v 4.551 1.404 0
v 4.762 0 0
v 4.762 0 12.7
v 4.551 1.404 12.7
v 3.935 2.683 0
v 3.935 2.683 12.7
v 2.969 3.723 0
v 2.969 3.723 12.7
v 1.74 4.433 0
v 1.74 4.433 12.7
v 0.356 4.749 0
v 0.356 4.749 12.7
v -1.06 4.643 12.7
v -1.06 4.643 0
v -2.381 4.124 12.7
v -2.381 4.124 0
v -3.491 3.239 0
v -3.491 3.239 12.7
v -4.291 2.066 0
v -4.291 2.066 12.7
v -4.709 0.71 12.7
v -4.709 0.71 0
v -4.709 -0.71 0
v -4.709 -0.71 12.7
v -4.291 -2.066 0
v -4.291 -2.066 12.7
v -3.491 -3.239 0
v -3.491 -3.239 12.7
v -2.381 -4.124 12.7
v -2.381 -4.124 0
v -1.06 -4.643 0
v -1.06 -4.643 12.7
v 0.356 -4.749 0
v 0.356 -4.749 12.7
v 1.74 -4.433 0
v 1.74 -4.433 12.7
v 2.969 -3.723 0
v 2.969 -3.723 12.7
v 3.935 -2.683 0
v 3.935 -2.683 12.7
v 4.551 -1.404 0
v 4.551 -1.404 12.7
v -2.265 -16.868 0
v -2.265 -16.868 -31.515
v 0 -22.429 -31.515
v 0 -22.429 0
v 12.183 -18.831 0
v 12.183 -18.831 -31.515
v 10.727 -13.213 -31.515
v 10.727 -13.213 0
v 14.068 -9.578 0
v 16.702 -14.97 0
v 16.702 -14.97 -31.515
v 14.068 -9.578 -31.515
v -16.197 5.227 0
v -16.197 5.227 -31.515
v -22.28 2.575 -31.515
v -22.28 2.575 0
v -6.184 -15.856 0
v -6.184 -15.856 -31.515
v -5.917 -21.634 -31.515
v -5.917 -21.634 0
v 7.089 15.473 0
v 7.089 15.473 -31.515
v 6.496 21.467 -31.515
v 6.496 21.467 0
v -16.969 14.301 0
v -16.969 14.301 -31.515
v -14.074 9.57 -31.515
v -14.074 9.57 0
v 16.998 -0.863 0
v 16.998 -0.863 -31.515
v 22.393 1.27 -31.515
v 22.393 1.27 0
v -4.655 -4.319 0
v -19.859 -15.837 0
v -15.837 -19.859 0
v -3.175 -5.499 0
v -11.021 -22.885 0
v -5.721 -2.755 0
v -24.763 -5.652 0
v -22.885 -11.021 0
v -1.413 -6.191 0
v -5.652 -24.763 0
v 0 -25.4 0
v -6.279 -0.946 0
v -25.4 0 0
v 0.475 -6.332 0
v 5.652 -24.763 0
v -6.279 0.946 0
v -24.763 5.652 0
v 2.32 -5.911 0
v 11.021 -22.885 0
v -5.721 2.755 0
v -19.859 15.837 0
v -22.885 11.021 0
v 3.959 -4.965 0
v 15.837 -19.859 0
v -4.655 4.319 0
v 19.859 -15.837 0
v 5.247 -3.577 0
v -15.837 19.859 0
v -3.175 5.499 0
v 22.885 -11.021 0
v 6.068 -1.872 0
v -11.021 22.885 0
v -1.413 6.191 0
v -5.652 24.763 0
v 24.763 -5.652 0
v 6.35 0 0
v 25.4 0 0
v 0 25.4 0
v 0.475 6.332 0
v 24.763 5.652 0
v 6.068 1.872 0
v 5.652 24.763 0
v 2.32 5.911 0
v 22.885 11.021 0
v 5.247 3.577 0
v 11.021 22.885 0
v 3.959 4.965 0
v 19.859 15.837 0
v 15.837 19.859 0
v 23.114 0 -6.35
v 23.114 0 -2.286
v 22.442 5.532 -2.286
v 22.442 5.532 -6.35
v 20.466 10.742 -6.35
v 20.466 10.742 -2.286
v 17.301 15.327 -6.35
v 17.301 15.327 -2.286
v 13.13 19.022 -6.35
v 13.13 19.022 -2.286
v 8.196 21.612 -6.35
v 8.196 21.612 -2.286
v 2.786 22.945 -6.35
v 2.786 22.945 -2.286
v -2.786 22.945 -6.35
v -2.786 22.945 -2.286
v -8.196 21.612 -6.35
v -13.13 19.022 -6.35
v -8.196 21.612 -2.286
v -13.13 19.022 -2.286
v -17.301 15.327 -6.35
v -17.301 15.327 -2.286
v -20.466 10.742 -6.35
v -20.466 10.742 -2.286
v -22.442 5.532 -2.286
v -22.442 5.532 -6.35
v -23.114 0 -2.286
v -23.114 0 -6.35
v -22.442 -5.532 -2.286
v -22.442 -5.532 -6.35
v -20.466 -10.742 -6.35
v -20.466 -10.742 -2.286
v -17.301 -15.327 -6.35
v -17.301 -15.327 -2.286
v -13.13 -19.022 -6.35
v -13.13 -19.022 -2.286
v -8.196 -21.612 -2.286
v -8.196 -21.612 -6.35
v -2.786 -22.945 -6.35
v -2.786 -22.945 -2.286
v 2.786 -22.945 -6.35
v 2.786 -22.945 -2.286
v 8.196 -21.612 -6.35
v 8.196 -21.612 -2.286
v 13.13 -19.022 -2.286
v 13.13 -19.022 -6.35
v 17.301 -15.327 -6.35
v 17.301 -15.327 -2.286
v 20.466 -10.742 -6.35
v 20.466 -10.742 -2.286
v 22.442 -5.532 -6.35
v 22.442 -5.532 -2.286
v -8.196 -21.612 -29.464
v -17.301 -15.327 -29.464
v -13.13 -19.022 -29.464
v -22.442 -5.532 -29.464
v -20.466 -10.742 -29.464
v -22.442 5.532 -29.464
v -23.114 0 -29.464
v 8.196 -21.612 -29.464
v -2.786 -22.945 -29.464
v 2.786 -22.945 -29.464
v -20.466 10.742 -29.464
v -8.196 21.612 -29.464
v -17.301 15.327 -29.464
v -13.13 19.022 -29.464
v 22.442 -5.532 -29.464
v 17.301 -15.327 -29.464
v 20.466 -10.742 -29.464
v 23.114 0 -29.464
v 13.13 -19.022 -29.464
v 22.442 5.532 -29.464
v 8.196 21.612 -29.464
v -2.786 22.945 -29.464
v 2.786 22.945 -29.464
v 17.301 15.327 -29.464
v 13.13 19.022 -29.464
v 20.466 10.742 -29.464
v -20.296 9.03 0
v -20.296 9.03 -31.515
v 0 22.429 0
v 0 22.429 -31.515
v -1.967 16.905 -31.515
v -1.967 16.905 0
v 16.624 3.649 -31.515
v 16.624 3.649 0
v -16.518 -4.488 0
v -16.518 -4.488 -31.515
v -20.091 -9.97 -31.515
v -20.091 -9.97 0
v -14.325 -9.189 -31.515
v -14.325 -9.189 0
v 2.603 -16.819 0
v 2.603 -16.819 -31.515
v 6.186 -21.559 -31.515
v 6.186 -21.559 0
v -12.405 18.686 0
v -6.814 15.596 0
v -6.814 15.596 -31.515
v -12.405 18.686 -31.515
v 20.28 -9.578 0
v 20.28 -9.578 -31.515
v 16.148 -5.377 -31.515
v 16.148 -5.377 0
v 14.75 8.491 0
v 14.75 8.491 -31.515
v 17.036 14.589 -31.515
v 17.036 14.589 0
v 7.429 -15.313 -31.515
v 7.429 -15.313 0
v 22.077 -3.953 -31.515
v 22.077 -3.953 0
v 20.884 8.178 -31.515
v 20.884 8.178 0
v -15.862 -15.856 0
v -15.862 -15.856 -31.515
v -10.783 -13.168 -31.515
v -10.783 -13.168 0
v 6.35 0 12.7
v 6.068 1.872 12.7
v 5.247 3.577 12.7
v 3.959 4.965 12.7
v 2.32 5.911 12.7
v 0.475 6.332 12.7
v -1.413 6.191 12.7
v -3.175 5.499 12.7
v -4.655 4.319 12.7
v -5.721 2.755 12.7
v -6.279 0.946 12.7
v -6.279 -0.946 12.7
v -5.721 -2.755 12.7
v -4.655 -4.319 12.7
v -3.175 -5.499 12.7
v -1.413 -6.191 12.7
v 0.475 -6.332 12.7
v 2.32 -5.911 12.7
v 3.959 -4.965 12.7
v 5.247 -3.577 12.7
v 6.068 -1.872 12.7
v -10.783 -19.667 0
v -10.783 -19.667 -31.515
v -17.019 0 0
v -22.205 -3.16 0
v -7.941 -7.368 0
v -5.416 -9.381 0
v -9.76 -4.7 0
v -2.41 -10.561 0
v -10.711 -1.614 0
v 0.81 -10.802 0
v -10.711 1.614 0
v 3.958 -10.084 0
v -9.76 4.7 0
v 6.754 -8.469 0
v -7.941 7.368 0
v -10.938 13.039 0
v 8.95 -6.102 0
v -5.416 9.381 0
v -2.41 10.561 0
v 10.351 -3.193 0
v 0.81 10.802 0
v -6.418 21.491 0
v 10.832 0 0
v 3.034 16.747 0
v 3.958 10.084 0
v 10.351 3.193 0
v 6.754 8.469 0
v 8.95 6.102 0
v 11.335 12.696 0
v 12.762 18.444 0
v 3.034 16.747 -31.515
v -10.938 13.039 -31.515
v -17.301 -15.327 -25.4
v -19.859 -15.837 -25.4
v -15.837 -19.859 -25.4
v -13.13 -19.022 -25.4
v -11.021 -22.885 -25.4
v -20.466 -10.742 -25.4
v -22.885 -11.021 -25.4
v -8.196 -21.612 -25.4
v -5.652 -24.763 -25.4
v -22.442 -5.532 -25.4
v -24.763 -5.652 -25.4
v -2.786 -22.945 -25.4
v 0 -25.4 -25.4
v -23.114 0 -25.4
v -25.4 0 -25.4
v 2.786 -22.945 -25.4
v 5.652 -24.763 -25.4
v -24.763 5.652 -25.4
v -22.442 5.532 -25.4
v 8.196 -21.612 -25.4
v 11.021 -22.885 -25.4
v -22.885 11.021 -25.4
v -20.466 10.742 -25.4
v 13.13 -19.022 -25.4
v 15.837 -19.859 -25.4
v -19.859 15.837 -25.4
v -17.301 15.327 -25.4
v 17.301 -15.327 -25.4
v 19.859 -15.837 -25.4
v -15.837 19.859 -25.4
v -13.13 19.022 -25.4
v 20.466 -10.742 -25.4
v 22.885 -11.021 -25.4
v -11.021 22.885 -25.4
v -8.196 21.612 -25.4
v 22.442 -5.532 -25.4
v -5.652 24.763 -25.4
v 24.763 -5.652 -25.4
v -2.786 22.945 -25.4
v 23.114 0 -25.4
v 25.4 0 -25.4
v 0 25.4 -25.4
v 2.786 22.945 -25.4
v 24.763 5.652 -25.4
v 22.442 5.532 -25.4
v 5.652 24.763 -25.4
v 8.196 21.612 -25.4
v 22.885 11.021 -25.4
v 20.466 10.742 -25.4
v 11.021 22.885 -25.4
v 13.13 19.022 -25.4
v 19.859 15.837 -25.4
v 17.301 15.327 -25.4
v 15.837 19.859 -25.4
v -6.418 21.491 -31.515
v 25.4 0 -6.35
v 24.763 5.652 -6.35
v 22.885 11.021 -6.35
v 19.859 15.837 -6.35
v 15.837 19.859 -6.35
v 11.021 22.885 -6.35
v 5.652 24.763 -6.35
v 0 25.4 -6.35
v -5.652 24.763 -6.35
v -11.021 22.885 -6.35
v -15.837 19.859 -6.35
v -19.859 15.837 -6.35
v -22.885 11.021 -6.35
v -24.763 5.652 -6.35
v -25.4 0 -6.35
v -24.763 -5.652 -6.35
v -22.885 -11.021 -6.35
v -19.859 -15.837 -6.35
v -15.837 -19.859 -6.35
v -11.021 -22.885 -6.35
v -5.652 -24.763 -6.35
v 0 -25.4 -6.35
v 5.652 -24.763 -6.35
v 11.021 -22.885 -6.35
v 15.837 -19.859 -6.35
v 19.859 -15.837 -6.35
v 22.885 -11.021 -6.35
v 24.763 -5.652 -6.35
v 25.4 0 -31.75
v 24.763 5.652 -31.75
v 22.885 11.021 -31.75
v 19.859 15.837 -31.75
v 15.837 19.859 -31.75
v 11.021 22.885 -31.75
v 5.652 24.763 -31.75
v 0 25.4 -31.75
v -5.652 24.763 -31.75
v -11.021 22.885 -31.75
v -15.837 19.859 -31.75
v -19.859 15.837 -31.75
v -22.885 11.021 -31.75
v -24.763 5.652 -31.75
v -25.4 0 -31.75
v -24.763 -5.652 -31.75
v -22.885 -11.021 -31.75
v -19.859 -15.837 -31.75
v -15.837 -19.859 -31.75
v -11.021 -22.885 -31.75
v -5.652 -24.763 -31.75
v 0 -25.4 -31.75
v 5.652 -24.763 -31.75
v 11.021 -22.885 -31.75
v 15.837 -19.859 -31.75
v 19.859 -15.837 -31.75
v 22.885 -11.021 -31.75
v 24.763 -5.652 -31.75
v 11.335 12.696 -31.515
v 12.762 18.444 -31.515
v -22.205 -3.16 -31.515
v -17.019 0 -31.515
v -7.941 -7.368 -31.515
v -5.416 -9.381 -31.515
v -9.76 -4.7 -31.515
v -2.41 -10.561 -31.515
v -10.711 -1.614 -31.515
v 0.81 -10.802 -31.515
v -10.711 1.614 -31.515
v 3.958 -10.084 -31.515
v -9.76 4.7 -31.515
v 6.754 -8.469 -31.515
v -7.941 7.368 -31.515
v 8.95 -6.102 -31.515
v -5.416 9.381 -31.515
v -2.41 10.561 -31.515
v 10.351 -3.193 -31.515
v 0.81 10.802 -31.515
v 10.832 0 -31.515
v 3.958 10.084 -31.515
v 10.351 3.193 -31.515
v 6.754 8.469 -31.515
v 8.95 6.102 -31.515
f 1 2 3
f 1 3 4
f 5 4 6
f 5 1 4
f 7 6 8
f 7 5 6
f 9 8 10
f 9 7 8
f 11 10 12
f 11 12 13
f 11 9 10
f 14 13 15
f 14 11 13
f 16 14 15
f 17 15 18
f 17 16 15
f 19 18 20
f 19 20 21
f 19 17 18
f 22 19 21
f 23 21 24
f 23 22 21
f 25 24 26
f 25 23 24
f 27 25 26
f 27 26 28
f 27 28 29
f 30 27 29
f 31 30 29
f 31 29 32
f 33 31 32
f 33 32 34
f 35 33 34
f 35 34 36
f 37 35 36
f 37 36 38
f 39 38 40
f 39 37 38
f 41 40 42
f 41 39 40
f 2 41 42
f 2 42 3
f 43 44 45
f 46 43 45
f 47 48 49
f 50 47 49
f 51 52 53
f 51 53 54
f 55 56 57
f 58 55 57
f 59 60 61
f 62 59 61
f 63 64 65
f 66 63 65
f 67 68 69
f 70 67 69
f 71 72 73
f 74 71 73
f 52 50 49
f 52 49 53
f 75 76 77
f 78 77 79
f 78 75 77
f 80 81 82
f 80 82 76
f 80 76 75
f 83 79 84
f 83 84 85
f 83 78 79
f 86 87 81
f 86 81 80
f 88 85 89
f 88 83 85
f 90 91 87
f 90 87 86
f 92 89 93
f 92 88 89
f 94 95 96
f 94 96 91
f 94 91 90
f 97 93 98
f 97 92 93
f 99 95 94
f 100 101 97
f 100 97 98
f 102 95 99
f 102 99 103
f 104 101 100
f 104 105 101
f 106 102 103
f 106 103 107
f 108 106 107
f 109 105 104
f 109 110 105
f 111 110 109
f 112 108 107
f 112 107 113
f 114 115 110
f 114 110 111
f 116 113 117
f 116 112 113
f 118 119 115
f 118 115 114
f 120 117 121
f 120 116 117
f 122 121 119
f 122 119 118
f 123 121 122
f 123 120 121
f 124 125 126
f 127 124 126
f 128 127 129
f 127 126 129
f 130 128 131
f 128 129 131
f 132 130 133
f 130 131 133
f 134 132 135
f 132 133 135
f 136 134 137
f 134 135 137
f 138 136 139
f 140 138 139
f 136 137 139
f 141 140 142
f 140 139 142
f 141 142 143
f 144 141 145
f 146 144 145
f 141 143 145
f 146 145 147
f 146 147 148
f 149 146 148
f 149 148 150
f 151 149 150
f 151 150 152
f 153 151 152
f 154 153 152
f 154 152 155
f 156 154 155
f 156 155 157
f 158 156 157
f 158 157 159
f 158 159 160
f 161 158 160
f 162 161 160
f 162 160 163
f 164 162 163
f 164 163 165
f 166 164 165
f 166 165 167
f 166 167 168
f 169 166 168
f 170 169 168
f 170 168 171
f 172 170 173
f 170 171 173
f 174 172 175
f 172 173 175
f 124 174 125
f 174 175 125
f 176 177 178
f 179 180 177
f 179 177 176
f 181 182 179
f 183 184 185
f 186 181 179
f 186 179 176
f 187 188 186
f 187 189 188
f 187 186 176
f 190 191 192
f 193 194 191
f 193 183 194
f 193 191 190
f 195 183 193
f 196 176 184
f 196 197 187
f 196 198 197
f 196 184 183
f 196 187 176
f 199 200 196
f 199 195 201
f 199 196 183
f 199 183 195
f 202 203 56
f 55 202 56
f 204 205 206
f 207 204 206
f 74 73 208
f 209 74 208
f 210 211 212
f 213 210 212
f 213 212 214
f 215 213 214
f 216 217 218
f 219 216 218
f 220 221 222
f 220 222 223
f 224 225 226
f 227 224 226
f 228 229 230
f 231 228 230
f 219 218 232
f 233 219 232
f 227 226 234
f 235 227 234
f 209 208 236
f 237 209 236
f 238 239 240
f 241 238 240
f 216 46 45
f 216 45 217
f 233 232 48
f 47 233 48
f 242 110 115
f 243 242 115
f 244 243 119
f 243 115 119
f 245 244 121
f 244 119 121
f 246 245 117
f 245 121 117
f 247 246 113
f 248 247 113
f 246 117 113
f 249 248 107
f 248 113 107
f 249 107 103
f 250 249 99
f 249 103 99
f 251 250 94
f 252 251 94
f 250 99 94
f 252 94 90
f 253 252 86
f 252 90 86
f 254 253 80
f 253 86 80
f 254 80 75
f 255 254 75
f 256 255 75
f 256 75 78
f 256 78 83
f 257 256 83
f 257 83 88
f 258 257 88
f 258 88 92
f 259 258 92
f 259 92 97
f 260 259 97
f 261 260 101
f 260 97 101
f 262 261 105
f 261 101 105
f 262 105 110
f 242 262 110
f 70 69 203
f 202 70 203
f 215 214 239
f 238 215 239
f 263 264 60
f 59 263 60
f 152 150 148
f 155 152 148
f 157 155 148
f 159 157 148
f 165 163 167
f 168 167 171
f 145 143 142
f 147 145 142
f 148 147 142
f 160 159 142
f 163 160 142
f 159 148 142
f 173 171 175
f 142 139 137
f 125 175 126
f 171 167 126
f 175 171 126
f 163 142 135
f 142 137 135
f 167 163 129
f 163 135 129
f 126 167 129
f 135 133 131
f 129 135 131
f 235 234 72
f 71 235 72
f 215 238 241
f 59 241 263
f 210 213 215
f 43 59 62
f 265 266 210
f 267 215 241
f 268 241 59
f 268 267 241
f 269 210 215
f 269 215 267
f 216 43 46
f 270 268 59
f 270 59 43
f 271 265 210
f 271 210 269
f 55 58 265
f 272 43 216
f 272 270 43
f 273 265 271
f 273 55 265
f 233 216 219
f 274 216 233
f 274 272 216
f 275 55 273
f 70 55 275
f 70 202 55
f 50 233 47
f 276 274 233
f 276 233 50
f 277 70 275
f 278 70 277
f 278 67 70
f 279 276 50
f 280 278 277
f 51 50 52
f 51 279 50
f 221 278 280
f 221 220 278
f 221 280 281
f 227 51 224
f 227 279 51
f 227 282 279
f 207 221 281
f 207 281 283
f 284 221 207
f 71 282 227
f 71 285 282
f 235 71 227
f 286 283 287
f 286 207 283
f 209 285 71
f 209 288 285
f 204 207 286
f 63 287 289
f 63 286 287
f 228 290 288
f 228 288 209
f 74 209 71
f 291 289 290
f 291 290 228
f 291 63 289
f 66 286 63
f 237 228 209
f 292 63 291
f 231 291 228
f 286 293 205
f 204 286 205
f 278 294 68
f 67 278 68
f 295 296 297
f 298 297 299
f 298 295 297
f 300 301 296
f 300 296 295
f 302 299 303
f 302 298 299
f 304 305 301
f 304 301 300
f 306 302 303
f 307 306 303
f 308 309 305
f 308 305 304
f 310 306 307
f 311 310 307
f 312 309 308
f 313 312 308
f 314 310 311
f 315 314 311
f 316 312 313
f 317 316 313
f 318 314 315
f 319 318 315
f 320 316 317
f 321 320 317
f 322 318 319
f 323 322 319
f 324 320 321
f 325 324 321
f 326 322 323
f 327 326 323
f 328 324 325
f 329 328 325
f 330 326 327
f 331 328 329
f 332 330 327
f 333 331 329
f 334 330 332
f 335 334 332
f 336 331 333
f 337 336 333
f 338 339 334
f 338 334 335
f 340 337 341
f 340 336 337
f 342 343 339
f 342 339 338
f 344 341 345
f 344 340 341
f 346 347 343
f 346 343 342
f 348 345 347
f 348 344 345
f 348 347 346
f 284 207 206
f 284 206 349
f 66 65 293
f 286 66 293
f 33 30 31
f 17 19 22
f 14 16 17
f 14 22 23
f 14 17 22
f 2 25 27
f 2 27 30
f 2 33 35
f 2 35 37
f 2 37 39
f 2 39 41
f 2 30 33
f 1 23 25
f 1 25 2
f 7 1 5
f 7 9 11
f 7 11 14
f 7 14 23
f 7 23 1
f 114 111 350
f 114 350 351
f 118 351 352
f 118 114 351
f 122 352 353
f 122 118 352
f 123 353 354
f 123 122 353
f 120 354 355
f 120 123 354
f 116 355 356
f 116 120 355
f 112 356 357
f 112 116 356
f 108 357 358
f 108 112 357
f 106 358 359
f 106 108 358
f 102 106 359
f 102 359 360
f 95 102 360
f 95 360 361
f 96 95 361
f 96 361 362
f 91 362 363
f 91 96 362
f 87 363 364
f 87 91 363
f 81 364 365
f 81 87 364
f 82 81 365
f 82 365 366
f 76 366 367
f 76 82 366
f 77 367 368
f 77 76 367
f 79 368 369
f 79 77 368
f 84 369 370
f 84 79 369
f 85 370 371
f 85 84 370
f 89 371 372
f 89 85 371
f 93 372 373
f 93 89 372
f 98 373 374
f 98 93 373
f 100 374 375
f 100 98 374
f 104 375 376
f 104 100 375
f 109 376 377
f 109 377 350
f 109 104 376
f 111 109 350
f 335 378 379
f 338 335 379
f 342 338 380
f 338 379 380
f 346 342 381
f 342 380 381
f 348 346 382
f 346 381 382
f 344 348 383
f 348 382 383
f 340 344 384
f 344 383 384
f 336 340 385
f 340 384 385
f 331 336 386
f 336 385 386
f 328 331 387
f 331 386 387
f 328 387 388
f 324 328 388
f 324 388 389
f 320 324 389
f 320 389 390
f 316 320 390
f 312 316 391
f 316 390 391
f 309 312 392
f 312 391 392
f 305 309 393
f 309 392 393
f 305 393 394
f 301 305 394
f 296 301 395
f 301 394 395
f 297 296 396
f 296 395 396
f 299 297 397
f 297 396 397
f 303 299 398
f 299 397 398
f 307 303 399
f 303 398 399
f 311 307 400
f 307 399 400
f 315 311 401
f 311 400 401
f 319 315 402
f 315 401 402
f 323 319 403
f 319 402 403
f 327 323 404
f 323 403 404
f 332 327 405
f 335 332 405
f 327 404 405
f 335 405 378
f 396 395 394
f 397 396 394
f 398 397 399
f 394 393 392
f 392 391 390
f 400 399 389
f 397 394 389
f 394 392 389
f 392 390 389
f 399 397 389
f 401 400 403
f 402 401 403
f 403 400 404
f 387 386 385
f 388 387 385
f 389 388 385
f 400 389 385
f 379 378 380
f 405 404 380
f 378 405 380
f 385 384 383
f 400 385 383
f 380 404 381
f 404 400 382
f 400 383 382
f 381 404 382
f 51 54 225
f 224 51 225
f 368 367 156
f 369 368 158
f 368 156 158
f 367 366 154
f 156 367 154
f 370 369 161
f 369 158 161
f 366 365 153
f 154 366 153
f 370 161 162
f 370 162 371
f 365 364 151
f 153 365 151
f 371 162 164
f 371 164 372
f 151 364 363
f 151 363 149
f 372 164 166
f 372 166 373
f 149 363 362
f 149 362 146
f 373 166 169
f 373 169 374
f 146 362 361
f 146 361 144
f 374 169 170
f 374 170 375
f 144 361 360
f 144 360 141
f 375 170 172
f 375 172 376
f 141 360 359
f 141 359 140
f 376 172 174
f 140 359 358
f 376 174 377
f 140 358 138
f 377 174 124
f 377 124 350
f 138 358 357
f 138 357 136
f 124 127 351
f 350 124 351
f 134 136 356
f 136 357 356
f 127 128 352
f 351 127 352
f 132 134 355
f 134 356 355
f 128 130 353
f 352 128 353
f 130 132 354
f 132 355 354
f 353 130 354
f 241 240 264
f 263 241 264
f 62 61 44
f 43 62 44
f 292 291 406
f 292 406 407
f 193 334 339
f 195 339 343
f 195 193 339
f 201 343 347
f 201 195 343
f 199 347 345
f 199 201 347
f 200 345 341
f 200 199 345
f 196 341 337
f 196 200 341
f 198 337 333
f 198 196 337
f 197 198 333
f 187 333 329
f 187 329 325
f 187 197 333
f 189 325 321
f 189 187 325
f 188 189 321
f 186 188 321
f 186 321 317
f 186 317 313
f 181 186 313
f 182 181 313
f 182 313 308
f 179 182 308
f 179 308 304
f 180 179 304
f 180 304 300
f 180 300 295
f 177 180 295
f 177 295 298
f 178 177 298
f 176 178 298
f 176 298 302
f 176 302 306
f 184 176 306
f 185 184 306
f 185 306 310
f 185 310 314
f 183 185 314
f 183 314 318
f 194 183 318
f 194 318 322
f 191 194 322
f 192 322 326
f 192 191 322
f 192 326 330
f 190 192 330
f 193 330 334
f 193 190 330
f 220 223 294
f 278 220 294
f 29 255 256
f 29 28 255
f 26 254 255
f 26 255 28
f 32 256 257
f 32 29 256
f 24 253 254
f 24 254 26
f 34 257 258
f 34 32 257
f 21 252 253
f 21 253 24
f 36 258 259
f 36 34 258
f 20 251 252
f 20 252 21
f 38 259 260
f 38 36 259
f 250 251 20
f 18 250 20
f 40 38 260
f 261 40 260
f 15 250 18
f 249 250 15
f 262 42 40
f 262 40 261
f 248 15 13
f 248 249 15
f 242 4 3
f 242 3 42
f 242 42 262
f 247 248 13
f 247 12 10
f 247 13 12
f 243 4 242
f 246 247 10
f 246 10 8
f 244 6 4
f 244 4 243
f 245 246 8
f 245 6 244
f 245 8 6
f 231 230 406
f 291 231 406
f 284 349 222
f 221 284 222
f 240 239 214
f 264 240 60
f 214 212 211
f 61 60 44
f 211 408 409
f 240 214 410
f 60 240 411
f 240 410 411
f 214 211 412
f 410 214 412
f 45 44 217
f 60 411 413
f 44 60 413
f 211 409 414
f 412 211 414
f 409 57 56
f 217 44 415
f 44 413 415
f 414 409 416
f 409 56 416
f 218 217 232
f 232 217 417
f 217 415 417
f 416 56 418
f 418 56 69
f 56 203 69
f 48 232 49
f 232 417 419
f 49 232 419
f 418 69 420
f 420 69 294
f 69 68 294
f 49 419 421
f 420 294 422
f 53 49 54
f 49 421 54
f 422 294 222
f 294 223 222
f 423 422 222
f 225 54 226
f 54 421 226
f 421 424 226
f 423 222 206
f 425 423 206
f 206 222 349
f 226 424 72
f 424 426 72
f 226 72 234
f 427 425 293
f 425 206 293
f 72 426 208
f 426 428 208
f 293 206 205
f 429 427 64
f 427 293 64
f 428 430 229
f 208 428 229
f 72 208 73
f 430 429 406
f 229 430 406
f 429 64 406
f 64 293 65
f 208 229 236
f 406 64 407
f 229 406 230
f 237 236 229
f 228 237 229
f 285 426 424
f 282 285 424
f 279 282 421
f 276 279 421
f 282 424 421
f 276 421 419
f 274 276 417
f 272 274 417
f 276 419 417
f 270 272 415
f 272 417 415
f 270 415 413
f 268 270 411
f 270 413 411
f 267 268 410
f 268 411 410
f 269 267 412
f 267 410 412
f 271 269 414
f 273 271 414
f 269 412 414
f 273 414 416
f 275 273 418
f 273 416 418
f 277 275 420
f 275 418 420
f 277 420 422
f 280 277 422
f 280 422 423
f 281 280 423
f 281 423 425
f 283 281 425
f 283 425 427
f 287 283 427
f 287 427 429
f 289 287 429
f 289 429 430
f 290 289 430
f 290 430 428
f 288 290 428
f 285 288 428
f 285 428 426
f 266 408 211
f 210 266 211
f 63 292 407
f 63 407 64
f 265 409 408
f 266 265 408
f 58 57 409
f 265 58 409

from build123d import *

# Parameters (mm, degrees)
F0_R     = 6.35
F0_R_2   = 4.7625
F1_DEPTH = 12.7
F2_R     = 25.4
F3_DEPTH = 6.35
F4_T     = 2.286
F6_R     = 25.4
F7_DEPTH = 6.35
F8_T     = -2.286
F9_R     = 10.8324762704


# Not quite as in the source:
# - a shell that OpenCascade refuses in one call is made with other operations: the cavity is built on its own and cut out


with BuildPart() as f1:
    # F0 (on Top) → F1 (new body)
    with BuildSketch(Plane.XY):
        Circle(F0_R)
        Circle(F0_R_2, mode=Mode.SUBTRACT)
    extrude(amount=F1_DEPTH)

    # F2 (on Top) → F3 (join)
    with BuildSketch(Plane.XY):
        Circle(F2_R)
    extrude(amount=-F3_DEPTH)

    # F4: shell of thickness 2.286, made by hand


with BuildPart() as f4_core1:
    # F4_t2: copy of F1
    add(f1.part)

    # the walls: a layer under each face that stays
    f4_faces = [f4_core1.faces().sort_by_distance(p)[0] for p in [
        (-25.4, 0, -3.175),
        (-16.9333333333, -16.9333333333, 0),
        (-6.35, 0, 6.35),
        (-4.2333333333, -4.2333333333, 12.7),
        (-4.7625, 0, 6.35),
        (0, 0, 0),
    ]]
    thicken(f4_faces, amount=-F4_T, mode=Mode.SUBTRACT)

    # F4_s3 → F4_t4 (revolve, cut)
    with BuildSketch(Plane.XZ):
        Polygon((6.37286, 0.02286), (6.35, -2.286), (4.064, -2.286), (4.064, 0), align=None)
    revolve(axis=Axis((0, 0, 0), (0, 0, 1)), mode=Mode.SUBTRACT)

    # F4_s5 → F4_t6 (revolve, cut)
    with BuildSketch(Plane.XZ):
        Polygon((4.73964, 0.02286), (7.0485, 0), (7.0485, -2.286), (4.7625, -2.286), align=None)
    revolve(axis=Axis((0, 0, 0), (0, 0, 1)), mode=Mode.SUBTRACT)


with BuildPart() as f1_1:
    add(f1.part)

    # what is left inside the walls is the cavity
    f4_cavity = [f4_core1.part.solids().sort_by_distance(p)[0] for p in [
        (0, -7.704667, -2.30886),
    ]]
    add(f4_cavity, mode=Mode.SUBTRACT)


with BuildPart() as f7:
    # F6 (on offset) → F7 (new body)
    with BuildSketch(Plane.XY.offset(-31.75)):
        Circle(F6_R)
    extrude(amount=F7_DEPTH)

    # F8
    f8_openings = [f7.faces().sort_by_distance(p)[0] for p in [
        (0, 0, -25.4),
    ]]
    offset(amount=F8_T, openings=f8_openings)


with BuildPart() as f11:
    # F11: sweep along a path in F10
    with BuildLine(Plane.YZ) as f11_path:
        Line((0, 0), (0, -31.5147303045))
    # F9 (on Top) → F11 (sweep)
    with BuildSketch(Plane.XY):
        Polygon((-22.2801696853, 2.5754143982), (-17.0194395337, 0), (-22.2047725652, -3.1601892119), (-16.5178161114, -4.4880653732), (-20.0906647852, -9.9701509023), (-14.3254104125, -9.1893383088), (-15.8624105906, -15.8563126477), (-10.7827289936, -13.167918495), (-10.7827289936, -19.6665064508), (-6.1837424961, -15.8563126477), (-5.9169946662, -21.6339523585), (-2.2652936168, -16.8680101633), (0, -22.4285247069), (2.6029271509, -16.8192179452), (6.1861512021, -21.558530883), (7.4289074138, -15.3125000139), (12.1825904339, -18.8314420809), (10.7273710707, -13.2130553602), (16.7018596911, -14.9695224836), (14.0682479763, -9.5783986615), (20.2803599477, -9.5783986615), (16.1477248117, -5.3770164073), (22.0774019915, -3.9531053404), (16.99756164, -0.8626820586), (22.3925396791, 1.2699949796), (16.6237094694, 3.648781374), (20.8843409163, 8.1782042663), (14.7502192053, 8.4907217263), (17.0355213321, 14.588685118), (11.3350188011, 12.6956162047), (12.7622102664, 18.4435546911), (7.0890507934, 15.4727722432), (6.4961991134, 21.4671404152), (3.0343190109, 16.7467677532), (0, 22.4285247069), (-1.9673980921, 16.9053443262), (-6.4182103819, 21.4905862186), (-6.8137495325, 15.595965483), (-12.4052478598, 18.6855170136), (-10.9380790438, 13.0391621231), (-16.9691750647, 14.3013333161), (-14.0740074147, 9.5699340295), (-20.2957504461, 9.0299506542), (-16.1967538501, 5.2274742237), align=None)
        Circle(F9_R, mode=Mode.SUBTRACT)
    sweep(path=f11_path.line)


solid = Compound([f1_1.part, f7.part, f11.part])
